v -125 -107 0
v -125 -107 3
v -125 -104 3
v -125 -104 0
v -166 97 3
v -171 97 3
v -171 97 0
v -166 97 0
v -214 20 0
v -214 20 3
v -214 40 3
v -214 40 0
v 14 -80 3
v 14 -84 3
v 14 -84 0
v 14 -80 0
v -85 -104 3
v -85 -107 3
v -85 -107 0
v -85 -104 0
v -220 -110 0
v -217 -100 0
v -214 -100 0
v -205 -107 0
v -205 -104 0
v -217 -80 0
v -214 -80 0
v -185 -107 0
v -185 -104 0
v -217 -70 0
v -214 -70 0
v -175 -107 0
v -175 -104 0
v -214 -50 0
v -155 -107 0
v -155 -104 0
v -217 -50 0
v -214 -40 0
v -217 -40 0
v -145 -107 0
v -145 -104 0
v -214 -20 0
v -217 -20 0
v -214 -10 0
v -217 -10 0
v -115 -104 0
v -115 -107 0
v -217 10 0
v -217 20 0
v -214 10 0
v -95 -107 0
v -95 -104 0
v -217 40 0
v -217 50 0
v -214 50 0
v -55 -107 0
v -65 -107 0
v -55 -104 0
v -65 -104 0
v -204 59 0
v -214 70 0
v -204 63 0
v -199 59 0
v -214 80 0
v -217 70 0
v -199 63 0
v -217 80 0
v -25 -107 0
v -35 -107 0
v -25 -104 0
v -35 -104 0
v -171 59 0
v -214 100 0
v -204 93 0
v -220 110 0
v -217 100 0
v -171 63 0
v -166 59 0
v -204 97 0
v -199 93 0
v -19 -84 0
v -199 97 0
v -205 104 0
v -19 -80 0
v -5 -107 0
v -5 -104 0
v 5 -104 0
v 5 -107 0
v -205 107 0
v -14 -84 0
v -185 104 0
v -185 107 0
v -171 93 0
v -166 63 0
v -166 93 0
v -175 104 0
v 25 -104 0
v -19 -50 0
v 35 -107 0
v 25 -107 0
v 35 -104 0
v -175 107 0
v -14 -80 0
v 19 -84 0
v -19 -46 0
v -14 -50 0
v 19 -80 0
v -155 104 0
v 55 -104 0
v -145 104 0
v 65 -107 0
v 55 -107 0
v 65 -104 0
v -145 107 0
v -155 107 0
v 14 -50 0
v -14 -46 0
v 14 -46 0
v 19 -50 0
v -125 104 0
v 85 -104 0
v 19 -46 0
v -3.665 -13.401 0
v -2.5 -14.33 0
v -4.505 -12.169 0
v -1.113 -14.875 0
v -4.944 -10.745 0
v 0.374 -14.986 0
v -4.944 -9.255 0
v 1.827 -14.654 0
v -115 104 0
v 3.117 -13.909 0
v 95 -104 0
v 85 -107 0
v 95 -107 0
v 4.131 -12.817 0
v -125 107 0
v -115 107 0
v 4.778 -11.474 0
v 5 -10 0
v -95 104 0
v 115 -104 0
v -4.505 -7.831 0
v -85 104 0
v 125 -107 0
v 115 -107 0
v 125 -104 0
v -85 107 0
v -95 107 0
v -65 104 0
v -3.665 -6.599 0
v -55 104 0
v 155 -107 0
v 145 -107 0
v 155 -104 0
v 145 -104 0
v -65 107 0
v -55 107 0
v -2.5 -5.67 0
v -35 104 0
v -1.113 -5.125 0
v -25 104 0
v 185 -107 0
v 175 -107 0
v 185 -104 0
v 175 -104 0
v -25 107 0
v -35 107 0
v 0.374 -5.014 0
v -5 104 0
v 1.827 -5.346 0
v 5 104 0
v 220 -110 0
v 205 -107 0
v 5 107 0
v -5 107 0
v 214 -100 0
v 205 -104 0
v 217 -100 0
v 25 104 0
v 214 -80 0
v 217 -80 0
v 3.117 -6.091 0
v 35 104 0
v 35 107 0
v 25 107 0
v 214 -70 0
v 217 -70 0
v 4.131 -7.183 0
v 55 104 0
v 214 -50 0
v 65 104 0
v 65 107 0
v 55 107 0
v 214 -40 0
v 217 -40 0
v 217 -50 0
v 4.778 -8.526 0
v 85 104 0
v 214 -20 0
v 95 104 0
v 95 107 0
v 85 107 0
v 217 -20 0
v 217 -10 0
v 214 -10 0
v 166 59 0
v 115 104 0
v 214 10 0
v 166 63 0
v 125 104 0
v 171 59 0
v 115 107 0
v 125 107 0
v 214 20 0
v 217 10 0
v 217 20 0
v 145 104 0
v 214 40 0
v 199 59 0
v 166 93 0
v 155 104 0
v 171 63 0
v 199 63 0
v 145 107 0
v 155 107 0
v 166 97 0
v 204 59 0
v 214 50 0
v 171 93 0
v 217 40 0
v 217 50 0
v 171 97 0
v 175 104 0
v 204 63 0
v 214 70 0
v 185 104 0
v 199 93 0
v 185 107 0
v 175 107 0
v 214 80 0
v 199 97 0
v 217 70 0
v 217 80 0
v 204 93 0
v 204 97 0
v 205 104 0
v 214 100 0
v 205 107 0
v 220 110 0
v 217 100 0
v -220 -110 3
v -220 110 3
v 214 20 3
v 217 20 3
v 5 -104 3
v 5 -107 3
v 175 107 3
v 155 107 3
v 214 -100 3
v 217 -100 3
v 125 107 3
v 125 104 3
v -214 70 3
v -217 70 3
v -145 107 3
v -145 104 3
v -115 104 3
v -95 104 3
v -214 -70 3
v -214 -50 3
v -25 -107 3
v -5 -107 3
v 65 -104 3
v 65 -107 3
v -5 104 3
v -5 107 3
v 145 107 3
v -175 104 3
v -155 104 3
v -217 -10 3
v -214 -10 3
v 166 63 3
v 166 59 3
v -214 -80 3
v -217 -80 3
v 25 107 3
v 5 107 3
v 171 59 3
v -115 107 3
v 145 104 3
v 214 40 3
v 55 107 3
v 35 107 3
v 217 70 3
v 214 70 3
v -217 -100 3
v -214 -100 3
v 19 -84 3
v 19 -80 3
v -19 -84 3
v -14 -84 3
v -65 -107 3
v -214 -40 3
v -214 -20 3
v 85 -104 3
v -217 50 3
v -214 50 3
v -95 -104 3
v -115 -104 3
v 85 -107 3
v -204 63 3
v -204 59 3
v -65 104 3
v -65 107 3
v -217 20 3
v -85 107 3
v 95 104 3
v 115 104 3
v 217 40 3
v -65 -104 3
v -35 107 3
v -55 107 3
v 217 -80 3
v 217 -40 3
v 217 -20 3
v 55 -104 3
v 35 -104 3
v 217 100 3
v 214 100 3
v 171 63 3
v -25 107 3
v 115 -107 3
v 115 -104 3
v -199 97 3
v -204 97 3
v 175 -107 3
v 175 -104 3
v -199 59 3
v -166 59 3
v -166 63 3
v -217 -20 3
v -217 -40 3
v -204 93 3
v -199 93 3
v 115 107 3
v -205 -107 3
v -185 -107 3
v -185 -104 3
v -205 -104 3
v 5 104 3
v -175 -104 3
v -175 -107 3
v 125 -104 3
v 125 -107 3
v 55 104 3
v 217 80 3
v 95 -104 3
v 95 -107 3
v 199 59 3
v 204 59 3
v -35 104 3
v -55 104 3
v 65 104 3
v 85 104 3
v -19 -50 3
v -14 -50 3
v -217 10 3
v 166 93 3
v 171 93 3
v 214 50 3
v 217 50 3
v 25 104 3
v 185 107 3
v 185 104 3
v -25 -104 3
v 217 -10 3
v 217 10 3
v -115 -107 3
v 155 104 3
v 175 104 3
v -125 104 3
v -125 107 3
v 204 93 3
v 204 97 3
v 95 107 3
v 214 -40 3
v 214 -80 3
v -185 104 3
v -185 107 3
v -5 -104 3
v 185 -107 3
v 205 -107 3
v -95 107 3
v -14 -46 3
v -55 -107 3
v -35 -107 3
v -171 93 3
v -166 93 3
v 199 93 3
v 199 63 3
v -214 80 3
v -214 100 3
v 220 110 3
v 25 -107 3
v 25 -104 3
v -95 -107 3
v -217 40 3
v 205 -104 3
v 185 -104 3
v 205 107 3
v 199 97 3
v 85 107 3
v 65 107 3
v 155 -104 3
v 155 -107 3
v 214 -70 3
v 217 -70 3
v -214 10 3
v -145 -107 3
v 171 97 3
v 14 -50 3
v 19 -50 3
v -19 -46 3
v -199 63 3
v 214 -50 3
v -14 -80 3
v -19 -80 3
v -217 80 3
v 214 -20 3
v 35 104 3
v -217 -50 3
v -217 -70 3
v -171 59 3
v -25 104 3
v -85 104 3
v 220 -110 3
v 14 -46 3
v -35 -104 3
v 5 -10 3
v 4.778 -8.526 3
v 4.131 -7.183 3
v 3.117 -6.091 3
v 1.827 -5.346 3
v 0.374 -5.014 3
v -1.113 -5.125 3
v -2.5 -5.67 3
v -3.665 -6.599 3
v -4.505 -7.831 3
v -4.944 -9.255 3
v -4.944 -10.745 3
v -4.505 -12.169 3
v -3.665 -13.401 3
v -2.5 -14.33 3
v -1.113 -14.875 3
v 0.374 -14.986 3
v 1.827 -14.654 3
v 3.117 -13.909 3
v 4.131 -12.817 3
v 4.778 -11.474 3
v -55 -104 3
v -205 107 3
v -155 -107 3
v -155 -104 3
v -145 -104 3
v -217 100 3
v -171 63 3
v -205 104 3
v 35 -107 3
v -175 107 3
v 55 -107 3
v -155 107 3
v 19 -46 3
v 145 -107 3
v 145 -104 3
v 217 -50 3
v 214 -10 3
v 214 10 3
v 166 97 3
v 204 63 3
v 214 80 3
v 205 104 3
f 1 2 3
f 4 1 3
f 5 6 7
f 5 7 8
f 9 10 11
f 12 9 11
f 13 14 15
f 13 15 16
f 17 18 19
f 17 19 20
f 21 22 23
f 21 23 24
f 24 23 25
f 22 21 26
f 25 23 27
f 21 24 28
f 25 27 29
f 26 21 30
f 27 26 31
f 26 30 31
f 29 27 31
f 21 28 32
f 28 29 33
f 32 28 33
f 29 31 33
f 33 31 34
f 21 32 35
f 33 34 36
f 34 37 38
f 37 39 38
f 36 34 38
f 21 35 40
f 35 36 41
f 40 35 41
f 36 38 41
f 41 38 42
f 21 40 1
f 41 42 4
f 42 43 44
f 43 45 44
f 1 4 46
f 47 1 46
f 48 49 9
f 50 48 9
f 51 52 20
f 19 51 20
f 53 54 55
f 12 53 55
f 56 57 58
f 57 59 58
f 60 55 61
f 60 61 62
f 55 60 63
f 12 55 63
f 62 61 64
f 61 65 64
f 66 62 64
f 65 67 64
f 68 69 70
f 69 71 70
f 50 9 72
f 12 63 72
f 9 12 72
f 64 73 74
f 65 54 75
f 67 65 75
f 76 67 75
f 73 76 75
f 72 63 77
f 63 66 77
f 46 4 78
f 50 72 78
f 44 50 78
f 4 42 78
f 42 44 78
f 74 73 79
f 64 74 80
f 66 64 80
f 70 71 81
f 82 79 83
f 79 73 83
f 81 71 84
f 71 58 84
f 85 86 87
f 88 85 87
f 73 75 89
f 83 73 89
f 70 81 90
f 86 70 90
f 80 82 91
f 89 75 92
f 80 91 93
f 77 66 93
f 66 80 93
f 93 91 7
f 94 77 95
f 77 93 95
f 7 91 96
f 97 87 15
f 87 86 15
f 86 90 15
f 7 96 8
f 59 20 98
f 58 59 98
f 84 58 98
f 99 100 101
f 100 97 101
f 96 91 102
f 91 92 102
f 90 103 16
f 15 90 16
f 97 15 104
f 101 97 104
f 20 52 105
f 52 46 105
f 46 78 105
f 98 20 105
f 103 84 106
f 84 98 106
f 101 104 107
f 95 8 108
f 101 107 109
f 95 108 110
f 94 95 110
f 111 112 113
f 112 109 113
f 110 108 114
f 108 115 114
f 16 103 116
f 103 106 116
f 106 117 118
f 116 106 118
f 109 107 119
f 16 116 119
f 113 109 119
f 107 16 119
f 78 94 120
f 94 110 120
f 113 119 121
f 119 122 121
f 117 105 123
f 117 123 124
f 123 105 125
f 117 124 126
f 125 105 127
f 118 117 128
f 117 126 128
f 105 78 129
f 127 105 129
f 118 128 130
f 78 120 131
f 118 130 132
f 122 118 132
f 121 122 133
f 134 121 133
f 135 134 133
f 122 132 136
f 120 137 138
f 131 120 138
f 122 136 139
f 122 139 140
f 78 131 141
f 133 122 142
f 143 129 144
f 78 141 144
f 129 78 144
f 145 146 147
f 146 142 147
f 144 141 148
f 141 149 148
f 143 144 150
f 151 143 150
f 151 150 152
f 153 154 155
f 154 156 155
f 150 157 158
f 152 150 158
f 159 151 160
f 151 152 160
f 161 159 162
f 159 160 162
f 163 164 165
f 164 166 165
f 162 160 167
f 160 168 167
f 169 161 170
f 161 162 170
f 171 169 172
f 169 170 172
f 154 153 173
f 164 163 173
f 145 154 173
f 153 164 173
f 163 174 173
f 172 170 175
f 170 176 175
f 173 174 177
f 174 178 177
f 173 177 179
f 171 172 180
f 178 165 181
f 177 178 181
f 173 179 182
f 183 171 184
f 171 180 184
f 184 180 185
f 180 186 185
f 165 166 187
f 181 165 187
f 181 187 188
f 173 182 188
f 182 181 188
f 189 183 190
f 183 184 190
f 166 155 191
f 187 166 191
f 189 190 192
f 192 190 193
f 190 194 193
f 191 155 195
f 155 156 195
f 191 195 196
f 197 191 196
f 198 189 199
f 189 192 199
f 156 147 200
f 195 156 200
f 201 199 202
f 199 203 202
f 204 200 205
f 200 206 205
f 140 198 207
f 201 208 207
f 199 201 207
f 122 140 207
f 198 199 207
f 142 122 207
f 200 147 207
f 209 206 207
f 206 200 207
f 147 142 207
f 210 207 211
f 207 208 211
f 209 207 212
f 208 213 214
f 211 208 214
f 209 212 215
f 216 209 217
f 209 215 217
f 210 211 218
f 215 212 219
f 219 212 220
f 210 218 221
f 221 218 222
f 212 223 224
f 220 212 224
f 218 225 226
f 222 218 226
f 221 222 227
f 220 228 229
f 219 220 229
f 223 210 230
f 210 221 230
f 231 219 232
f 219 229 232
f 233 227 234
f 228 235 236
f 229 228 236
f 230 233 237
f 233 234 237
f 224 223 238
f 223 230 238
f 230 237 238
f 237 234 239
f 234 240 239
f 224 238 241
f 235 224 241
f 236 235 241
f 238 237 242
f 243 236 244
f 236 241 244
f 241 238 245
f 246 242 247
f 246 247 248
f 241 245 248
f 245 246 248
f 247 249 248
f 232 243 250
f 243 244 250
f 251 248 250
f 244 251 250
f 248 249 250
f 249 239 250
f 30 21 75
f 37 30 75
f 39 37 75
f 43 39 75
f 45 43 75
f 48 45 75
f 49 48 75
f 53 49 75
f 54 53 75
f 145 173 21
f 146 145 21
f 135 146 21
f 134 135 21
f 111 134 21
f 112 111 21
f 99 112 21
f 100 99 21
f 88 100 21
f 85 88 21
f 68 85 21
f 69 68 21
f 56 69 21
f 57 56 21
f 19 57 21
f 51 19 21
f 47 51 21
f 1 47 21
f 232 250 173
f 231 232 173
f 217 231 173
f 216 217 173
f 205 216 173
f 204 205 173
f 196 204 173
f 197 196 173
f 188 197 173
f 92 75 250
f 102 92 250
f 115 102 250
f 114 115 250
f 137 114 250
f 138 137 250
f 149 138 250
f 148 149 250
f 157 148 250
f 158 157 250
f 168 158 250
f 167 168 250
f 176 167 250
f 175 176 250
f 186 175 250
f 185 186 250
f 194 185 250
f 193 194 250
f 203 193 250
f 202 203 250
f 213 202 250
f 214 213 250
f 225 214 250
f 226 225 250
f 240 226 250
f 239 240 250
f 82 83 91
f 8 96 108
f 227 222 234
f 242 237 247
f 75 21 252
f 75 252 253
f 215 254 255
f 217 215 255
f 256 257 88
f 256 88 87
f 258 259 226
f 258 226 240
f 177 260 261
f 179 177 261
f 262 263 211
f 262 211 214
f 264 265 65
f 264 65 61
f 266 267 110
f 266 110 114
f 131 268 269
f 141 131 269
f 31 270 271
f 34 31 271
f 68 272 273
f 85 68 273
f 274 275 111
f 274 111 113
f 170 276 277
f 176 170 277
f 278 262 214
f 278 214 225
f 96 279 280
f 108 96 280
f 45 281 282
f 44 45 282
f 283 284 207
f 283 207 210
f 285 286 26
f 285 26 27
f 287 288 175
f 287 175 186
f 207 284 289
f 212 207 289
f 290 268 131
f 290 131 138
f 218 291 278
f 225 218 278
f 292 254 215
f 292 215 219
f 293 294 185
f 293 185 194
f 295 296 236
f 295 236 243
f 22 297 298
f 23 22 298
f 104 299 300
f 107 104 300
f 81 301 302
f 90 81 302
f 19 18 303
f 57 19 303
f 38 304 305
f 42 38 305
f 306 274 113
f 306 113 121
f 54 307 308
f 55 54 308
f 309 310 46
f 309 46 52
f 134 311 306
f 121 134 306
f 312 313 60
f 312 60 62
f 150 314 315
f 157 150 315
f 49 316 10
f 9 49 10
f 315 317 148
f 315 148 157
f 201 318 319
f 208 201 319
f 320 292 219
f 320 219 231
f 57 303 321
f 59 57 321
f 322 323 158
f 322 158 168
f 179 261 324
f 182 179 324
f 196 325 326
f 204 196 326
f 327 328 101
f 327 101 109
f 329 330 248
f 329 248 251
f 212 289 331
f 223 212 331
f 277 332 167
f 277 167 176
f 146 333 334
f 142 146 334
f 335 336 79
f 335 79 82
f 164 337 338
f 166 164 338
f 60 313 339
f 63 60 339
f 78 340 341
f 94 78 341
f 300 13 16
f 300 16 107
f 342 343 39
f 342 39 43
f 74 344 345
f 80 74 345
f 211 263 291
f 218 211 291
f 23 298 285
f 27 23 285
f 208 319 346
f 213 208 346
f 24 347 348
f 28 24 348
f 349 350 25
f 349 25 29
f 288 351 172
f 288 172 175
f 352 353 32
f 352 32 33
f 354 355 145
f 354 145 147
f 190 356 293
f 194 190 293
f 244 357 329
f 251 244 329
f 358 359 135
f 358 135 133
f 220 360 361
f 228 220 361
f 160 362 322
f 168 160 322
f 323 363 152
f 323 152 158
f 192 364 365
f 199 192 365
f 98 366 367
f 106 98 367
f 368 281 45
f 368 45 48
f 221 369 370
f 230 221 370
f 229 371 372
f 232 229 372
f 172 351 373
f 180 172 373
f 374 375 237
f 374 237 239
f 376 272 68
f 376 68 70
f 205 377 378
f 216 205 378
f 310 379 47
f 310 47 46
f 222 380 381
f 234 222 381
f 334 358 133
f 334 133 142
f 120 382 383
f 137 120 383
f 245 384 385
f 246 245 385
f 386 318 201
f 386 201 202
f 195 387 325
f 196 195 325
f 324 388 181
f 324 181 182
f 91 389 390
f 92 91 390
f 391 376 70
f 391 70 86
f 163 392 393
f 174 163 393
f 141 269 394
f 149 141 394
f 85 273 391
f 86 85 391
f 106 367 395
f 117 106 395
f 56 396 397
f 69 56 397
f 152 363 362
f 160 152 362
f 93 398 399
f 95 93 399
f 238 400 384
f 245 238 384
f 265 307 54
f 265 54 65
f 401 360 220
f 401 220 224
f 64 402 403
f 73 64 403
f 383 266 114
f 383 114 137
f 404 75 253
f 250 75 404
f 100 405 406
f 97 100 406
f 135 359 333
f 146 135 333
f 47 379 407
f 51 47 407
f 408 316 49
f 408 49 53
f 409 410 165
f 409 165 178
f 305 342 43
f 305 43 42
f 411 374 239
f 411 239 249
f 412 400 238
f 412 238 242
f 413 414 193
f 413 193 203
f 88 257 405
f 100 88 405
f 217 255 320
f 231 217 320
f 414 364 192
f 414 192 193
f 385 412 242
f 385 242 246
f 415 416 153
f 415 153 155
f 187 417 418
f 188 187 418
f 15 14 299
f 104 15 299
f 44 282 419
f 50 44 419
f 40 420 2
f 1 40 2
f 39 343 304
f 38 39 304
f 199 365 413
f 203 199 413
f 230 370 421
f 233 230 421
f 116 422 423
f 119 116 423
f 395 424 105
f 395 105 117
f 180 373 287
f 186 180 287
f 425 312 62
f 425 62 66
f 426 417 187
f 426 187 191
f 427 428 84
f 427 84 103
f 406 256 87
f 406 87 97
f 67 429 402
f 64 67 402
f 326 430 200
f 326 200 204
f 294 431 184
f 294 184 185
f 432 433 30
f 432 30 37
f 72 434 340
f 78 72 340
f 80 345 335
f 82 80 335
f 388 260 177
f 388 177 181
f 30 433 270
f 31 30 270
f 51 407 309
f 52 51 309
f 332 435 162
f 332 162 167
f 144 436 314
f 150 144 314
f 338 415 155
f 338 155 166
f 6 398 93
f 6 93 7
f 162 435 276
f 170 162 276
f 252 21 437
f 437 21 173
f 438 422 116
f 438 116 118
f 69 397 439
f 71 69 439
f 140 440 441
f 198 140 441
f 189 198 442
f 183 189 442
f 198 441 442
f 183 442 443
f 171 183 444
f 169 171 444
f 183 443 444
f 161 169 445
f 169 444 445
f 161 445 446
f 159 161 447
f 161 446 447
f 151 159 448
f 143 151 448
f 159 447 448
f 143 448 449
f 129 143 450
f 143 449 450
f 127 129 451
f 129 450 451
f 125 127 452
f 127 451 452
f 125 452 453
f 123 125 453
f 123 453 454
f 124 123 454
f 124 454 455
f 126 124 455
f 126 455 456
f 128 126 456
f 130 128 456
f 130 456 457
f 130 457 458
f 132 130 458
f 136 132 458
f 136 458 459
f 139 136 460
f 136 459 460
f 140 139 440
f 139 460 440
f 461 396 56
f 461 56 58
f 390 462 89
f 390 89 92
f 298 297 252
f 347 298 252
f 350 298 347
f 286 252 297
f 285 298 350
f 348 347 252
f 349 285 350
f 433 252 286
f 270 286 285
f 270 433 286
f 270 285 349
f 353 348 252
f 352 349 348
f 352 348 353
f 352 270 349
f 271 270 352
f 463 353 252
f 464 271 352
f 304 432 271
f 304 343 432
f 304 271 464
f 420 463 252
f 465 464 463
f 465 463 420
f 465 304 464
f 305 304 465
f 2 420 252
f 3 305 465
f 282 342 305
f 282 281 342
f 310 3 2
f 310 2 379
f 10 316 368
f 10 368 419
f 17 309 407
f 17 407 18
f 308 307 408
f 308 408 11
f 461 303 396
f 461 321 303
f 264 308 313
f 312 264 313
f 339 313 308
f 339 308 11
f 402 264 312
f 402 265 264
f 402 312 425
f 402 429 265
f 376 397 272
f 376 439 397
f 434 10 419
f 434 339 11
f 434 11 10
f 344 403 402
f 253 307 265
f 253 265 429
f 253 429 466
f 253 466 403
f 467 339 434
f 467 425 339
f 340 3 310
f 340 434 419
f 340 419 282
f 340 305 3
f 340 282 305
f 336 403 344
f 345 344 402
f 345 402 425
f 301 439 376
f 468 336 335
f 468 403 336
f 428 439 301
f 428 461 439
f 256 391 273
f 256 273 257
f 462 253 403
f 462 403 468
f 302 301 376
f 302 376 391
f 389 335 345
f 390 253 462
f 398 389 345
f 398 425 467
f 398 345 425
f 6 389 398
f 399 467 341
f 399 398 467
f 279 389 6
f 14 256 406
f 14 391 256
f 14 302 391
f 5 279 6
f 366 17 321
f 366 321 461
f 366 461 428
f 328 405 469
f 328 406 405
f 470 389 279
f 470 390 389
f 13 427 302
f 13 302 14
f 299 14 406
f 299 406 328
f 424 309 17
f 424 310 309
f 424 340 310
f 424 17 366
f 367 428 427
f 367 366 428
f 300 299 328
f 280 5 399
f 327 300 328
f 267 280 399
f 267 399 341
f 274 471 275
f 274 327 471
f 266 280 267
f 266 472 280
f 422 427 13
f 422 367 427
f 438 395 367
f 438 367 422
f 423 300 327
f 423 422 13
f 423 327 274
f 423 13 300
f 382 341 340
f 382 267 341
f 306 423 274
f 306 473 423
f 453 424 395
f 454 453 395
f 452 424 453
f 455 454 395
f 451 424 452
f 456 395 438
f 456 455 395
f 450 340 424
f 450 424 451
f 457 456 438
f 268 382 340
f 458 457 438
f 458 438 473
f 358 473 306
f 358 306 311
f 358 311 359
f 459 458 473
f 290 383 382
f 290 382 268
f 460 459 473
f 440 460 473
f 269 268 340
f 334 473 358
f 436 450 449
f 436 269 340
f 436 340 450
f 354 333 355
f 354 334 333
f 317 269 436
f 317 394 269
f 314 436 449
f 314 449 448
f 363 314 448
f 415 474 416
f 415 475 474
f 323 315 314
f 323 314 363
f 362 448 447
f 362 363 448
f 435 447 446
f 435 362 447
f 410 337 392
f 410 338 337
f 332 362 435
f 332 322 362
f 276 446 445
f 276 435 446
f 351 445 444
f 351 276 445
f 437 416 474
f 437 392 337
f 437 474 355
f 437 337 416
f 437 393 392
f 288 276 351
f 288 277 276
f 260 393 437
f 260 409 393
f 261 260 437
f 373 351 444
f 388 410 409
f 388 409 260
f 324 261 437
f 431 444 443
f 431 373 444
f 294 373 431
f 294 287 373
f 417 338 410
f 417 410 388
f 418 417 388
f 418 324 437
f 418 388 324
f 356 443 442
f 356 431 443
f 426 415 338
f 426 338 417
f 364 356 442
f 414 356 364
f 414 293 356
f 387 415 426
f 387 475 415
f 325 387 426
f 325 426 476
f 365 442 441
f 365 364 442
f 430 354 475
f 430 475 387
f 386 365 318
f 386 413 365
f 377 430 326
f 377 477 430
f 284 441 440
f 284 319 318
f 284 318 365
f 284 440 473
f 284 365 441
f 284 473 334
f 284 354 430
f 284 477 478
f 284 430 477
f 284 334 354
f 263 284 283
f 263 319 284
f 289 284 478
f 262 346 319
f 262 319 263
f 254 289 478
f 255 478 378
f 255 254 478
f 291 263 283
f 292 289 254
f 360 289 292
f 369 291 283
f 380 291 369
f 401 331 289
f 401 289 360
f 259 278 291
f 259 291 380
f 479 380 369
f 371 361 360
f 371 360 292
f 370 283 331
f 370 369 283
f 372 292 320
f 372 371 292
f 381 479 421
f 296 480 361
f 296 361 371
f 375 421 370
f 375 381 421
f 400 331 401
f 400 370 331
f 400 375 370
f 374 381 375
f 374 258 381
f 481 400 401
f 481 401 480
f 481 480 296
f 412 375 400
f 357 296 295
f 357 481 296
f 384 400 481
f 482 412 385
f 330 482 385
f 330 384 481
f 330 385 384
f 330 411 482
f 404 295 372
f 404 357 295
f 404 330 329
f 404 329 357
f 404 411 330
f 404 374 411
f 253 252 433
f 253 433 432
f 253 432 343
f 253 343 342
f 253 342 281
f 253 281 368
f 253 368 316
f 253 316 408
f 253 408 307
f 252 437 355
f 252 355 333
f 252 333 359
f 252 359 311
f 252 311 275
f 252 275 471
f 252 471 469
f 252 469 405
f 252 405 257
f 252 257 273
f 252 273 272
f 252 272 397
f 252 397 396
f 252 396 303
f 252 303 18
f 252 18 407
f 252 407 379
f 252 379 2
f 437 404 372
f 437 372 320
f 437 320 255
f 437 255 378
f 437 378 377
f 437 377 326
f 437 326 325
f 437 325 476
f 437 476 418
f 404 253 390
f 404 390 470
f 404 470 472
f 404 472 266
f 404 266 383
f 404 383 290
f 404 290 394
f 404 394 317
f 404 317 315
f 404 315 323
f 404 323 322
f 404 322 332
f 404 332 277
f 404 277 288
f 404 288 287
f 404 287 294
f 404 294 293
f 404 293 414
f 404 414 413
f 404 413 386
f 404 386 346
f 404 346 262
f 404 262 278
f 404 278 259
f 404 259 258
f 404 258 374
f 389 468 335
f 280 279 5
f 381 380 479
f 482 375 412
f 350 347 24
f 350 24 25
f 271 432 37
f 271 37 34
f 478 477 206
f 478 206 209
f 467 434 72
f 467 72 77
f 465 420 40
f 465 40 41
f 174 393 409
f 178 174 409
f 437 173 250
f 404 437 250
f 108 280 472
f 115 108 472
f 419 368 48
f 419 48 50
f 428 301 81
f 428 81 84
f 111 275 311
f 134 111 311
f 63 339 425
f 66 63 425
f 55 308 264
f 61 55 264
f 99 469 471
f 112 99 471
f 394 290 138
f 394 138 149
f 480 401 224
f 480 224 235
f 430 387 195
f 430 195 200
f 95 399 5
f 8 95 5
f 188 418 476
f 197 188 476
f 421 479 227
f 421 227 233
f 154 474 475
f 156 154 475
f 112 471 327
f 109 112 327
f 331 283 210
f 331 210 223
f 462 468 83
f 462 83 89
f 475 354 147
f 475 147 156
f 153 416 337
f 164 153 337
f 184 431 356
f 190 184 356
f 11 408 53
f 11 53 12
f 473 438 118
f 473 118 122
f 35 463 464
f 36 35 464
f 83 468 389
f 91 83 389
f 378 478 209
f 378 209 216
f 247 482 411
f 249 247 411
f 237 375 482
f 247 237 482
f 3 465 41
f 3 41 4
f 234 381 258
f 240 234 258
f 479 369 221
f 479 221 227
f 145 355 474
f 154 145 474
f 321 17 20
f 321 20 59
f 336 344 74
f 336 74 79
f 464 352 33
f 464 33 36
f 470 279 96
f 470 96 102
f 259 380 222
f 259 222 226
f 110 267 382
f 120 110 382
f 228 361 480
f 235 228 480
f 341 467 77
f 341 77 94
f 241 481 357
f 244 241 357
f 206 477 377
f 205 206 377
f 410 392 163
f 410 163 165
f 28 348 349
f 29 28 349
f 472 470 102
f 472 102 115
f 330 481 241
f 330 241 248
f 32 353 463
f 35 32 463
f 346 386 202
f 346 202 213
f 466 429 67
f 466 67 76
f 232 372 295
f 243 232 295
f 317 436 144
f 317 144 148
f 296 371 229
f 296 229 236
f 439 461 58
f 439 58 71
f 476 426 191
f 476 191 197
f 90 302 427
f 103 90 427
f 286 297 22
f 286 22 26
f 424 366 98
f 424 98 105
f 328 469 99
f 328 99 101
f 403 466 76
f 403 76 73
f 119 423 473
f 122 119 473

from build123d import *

# Parameters (mm, degrees)
ESQUISSE1_W             = 440
ESQUISSE1_H             = 220
BOSS_EXTRU_1_DEPTH      = 3
ESQUISSE2_R             = 5
ENL_V_MAT_EXTRU_1_DEPTH = 3
ESQUISSE3_W             = 5
ESQUISSE3_H             = 4
ENL_V_MAT_EXTRU_2_DEPTH = 3
ESQUISSE4_W             = 20
ESQUISSE4_H             = 3
ENL_V_MAT_EXTRU_3_DEPTH = 3
ESQUISSE5_W             = 3
ESQUISSE5_H             = 20
ENL_V_MAT_EXTRU_4_DEPTH = 3


with BuildPart() as part:
    # Esquisse1 → Boss.-Extru.1 (new body)
    with BuildSketch(Plane.XY):
        Rectangle(ESQUISSE1_W, ESQUISSE1_H)
    extrude(amount=BOSS_EXTRU_1_DEPTH)

    # Esquisse2 → Enlèv. mat.-Extru.1 (cut)
    with BuildSketch(Plane.XY.offset(3)):
        with Locations((0, -10)):
            Circle(ESQUISSE2_R)
    extrude(amount=-ENL_V_MAT_EXTRU_1_DEPTH, mode=Mode.SUBTRACT)

    # Esquisse3 → Enlèv. mat.-Extru.2 (cut)
    with BuildSketch(Plane.XY.offset(3)):
        with Locations((-201.5, 95)):
            Rectangle(ESQUISSE3_W, ESQUISSE3_H)
        with Locations((-168.5, 95)):
            Rectangle(ESQUISSE3_W, ESQUISSE3_H)
        with Locations((-168.5, 61)):
            Rectangle(ESQUISSE3_W, ESQUISSE3_H)
        with Locations((-201.5, 61)):
            Rectangle(ESQUISSE3_W, ESQUISSE3_H)
        with Locations((168.5, 61)):
            Rectangle(ESQUISSE3_W, ESQUISSE3_H)
        with Locations((201.5, 61)):
            Rectangle(ESQUISSE3_W, ESQUISSE3_H)
        with Locations((168.5, 95)):
            Rectangle(ESQUISSE3_W, ESQUISSE3_H)
        with Locations((201.5, 95)):
            Rectangle(ESQUISSE3_W, ESQUISSE3_H)
        with Locations((-16.5, -48)):
            Rectangle(ESQUISSE3_W, ESQUISSE3_H)
        with Locations((16.5, -48)):
            Rectangle(ESQUISSE3_W, ESQUISSE3_H)
        with Locations((16.5, -82)):
            Rectangle(ESQUISSE3_W, ESQUISSE3_H)
        with Locations((-16.5, -82)):
            Rectangle(ESQUISSE3_W, ESQUISSE3_H)
    extrude(amount=-ENL_V_MAT_EXTRU_2_DEPTH, mode=Mode.SUBTRACT)

    # Esquisse4 → Enlèv. mat.-Extru.3 (cut)
    with BuildSketch(Plane.XY.offset(3)):
        with Locations((-195, 105.5)):
            Rectangle(ESQUISSE4_W, ESQUISSE4_H)
        with Locations((-165, 105.5)):
            Rectangle(ESQUISSE4_W, ESQUISSE4_H)
        with Locations((-135, 105.5)):
            Rectangle(ESQUISSE4_W, ESQUISSE4_H)
        with Locations((-105, 105.5)):
            Rectangle(ESQUISSE4_W, ESQUISSE4_H)
        with Locations((-75, 105.5)):
            Rectangle(ESQUISSE4_W, ESQUISSE4_H)
        with Locations((-45, 105.5)):
            Rectangle(ESQUISSE4_W, ESQUISSE4_H)
        with Locations((-15, 105.5)):
            Rectangle(ESQUISSE4_W, ESQUISSE4_H)
        with Locations((15, 105.5)):
            Rectangle(ESQUISSE4_W, ESQUISSE4_H)
        with Locations((45, 105.5)):
            Rectangle(ESQUISSE4_W, ESQUISSE4_H)
        with Locations((75, 105.5)):
            Rectangle(ESQUISSE4_W, ESQUISSE4_H)
        with Locations((105, 105.5)):
            Rectangle(ESQUISSE4_W, ESQUISSE4_H)
        with Locations((135, 105.5)):
            Rectangle(ESQUISSE4_W, ESQUISSE4_H)
        with Locations((165, 105.5)):
            Rectangle(ESQUISSE4_W, ESQUISSE4_H)
        with Locations((195, 105.5)):
            Rectangle(ESQUISSE4_W, ESQUISSE4_H)
        with Locations((195, -105.5)):
            Rectangle(ESQUISSE4_W, ESQUISSE4_H)
        with Locations((165, -105.5)):
            Rectangle(ESQUISSE4_W, ESQUISSE4_H)
        with Locations((135, -105.5)):
            Rectangle(ESQUISSE4_W, ESQUISSE4_H)
        with Locations((105, -105.5)):
            Rectangle(ESQUISSE4_W, ESQUISSE4_H)
        with Locations((75, -105.5)):
            Rectangle(ESQUISSE4_W, ESQUISSE4_H)
        with Locations((45, -105.5)):
            Rectangle(ESQUISSE4_W, ESQUISSE4_H)
        with Locations((15, -105.5)):
            Rectangle(ESQUISSE4_W, ESQUISSE4_H)
        with Locations((-15, -105.5)):
            Rectangle(ESQUISSE4_W, ESQUISSE4_H)
        with Locations((-45, -105.5)):
            Rectangle(ESQUISSE4_W, ESQUISSE4_H)
        with Locations((-75, -105.5)):
            Rectangle(ESQUISSE4_W, ESQUISSE4_H)
        with Locations((-105, -105.5)):
            Rectangle(ESQUISSE4_W, ESQUISSE4_H)
        with Locations((-135, -105.5)):
            Rectangle(ESQUISSE4_W, ESQUISSE4_H)
        with Locations((-165, -105.5)):
            Rectangle(ESQUISSE4_W, ESQUISSE4_H)
        with Locations((-195, -105.5)):
            Rectangle(ESQUISSE4_W, ESQUISSE4_H)
    extrude(amount=-ENL_V_MAT_EXTRU_3_DEPTH, mode=Mode.SUBTRACT)

    # Esquisse5 → Enlèv. mat.-Extru.4 (cut)
    with BuildSketch(Plane.XY.offset(3)):
        with Locations((-215.5, -90)):
            Rectangle(ESQUISSE5_W, ESQUISSE5_H)
        with Locations((-215.5, -60)):
            Rectangle(ESQUISSE5_W, ESQUISSE5_H)
        with Locations((-215.5, -30)):
            Rectangle(ESQUISSE5_W, ESQUISSE5_H)
        with Locations((-215.5, 0)):
            Rectangle(ESQUISSE5_W, ESQUISSE5_H)
        with Locations((-215.5, 30)):
            Rectangle(ESQUISSE5_W, ESQUISSE5_H)
        with Locations((-215.5, 60)):
            Rectangle(ESQUISSE5_W, ESQUISSE5_H)
        with Locations((-215.5, 90)):
            Rectangle(ESQUISSE5_W, ESQUISSE5_H)
        with Locations((215.5, 90)):
            Rectangle(ESQUISSE5_W, ESQUISSE5_H)
        with Locations((215.5, 60)):
            Rectangle(ESQUISSE5_W, ESQUISSE5_H)
        with Locations((215.5, 30)):
            Rectangle(ESQUISSE5_W, ESQUISSE5_H)
        with Locations((215.5, 0)):
            Rectangle(ESQUISSE5_W, ESQUISSE5_H)
        with Locations((215.5, -30)):
            Rectangle(ESQUISSE5_W, ESQUISSE5_H)
        with Locations((215.5, -60)):
            Rectangle(ESQUISSE5_W, ESQUISSE5_H)
        with Locations((215.5, -90)):
            Rectangle(ESQUISSE5_W, ESQUISSE5_H)
    extrude(amount=-ENL_V_MAT_EXTRU_4_DEPTH, mode=Mode.SUBTRACT)


solid = part.part
